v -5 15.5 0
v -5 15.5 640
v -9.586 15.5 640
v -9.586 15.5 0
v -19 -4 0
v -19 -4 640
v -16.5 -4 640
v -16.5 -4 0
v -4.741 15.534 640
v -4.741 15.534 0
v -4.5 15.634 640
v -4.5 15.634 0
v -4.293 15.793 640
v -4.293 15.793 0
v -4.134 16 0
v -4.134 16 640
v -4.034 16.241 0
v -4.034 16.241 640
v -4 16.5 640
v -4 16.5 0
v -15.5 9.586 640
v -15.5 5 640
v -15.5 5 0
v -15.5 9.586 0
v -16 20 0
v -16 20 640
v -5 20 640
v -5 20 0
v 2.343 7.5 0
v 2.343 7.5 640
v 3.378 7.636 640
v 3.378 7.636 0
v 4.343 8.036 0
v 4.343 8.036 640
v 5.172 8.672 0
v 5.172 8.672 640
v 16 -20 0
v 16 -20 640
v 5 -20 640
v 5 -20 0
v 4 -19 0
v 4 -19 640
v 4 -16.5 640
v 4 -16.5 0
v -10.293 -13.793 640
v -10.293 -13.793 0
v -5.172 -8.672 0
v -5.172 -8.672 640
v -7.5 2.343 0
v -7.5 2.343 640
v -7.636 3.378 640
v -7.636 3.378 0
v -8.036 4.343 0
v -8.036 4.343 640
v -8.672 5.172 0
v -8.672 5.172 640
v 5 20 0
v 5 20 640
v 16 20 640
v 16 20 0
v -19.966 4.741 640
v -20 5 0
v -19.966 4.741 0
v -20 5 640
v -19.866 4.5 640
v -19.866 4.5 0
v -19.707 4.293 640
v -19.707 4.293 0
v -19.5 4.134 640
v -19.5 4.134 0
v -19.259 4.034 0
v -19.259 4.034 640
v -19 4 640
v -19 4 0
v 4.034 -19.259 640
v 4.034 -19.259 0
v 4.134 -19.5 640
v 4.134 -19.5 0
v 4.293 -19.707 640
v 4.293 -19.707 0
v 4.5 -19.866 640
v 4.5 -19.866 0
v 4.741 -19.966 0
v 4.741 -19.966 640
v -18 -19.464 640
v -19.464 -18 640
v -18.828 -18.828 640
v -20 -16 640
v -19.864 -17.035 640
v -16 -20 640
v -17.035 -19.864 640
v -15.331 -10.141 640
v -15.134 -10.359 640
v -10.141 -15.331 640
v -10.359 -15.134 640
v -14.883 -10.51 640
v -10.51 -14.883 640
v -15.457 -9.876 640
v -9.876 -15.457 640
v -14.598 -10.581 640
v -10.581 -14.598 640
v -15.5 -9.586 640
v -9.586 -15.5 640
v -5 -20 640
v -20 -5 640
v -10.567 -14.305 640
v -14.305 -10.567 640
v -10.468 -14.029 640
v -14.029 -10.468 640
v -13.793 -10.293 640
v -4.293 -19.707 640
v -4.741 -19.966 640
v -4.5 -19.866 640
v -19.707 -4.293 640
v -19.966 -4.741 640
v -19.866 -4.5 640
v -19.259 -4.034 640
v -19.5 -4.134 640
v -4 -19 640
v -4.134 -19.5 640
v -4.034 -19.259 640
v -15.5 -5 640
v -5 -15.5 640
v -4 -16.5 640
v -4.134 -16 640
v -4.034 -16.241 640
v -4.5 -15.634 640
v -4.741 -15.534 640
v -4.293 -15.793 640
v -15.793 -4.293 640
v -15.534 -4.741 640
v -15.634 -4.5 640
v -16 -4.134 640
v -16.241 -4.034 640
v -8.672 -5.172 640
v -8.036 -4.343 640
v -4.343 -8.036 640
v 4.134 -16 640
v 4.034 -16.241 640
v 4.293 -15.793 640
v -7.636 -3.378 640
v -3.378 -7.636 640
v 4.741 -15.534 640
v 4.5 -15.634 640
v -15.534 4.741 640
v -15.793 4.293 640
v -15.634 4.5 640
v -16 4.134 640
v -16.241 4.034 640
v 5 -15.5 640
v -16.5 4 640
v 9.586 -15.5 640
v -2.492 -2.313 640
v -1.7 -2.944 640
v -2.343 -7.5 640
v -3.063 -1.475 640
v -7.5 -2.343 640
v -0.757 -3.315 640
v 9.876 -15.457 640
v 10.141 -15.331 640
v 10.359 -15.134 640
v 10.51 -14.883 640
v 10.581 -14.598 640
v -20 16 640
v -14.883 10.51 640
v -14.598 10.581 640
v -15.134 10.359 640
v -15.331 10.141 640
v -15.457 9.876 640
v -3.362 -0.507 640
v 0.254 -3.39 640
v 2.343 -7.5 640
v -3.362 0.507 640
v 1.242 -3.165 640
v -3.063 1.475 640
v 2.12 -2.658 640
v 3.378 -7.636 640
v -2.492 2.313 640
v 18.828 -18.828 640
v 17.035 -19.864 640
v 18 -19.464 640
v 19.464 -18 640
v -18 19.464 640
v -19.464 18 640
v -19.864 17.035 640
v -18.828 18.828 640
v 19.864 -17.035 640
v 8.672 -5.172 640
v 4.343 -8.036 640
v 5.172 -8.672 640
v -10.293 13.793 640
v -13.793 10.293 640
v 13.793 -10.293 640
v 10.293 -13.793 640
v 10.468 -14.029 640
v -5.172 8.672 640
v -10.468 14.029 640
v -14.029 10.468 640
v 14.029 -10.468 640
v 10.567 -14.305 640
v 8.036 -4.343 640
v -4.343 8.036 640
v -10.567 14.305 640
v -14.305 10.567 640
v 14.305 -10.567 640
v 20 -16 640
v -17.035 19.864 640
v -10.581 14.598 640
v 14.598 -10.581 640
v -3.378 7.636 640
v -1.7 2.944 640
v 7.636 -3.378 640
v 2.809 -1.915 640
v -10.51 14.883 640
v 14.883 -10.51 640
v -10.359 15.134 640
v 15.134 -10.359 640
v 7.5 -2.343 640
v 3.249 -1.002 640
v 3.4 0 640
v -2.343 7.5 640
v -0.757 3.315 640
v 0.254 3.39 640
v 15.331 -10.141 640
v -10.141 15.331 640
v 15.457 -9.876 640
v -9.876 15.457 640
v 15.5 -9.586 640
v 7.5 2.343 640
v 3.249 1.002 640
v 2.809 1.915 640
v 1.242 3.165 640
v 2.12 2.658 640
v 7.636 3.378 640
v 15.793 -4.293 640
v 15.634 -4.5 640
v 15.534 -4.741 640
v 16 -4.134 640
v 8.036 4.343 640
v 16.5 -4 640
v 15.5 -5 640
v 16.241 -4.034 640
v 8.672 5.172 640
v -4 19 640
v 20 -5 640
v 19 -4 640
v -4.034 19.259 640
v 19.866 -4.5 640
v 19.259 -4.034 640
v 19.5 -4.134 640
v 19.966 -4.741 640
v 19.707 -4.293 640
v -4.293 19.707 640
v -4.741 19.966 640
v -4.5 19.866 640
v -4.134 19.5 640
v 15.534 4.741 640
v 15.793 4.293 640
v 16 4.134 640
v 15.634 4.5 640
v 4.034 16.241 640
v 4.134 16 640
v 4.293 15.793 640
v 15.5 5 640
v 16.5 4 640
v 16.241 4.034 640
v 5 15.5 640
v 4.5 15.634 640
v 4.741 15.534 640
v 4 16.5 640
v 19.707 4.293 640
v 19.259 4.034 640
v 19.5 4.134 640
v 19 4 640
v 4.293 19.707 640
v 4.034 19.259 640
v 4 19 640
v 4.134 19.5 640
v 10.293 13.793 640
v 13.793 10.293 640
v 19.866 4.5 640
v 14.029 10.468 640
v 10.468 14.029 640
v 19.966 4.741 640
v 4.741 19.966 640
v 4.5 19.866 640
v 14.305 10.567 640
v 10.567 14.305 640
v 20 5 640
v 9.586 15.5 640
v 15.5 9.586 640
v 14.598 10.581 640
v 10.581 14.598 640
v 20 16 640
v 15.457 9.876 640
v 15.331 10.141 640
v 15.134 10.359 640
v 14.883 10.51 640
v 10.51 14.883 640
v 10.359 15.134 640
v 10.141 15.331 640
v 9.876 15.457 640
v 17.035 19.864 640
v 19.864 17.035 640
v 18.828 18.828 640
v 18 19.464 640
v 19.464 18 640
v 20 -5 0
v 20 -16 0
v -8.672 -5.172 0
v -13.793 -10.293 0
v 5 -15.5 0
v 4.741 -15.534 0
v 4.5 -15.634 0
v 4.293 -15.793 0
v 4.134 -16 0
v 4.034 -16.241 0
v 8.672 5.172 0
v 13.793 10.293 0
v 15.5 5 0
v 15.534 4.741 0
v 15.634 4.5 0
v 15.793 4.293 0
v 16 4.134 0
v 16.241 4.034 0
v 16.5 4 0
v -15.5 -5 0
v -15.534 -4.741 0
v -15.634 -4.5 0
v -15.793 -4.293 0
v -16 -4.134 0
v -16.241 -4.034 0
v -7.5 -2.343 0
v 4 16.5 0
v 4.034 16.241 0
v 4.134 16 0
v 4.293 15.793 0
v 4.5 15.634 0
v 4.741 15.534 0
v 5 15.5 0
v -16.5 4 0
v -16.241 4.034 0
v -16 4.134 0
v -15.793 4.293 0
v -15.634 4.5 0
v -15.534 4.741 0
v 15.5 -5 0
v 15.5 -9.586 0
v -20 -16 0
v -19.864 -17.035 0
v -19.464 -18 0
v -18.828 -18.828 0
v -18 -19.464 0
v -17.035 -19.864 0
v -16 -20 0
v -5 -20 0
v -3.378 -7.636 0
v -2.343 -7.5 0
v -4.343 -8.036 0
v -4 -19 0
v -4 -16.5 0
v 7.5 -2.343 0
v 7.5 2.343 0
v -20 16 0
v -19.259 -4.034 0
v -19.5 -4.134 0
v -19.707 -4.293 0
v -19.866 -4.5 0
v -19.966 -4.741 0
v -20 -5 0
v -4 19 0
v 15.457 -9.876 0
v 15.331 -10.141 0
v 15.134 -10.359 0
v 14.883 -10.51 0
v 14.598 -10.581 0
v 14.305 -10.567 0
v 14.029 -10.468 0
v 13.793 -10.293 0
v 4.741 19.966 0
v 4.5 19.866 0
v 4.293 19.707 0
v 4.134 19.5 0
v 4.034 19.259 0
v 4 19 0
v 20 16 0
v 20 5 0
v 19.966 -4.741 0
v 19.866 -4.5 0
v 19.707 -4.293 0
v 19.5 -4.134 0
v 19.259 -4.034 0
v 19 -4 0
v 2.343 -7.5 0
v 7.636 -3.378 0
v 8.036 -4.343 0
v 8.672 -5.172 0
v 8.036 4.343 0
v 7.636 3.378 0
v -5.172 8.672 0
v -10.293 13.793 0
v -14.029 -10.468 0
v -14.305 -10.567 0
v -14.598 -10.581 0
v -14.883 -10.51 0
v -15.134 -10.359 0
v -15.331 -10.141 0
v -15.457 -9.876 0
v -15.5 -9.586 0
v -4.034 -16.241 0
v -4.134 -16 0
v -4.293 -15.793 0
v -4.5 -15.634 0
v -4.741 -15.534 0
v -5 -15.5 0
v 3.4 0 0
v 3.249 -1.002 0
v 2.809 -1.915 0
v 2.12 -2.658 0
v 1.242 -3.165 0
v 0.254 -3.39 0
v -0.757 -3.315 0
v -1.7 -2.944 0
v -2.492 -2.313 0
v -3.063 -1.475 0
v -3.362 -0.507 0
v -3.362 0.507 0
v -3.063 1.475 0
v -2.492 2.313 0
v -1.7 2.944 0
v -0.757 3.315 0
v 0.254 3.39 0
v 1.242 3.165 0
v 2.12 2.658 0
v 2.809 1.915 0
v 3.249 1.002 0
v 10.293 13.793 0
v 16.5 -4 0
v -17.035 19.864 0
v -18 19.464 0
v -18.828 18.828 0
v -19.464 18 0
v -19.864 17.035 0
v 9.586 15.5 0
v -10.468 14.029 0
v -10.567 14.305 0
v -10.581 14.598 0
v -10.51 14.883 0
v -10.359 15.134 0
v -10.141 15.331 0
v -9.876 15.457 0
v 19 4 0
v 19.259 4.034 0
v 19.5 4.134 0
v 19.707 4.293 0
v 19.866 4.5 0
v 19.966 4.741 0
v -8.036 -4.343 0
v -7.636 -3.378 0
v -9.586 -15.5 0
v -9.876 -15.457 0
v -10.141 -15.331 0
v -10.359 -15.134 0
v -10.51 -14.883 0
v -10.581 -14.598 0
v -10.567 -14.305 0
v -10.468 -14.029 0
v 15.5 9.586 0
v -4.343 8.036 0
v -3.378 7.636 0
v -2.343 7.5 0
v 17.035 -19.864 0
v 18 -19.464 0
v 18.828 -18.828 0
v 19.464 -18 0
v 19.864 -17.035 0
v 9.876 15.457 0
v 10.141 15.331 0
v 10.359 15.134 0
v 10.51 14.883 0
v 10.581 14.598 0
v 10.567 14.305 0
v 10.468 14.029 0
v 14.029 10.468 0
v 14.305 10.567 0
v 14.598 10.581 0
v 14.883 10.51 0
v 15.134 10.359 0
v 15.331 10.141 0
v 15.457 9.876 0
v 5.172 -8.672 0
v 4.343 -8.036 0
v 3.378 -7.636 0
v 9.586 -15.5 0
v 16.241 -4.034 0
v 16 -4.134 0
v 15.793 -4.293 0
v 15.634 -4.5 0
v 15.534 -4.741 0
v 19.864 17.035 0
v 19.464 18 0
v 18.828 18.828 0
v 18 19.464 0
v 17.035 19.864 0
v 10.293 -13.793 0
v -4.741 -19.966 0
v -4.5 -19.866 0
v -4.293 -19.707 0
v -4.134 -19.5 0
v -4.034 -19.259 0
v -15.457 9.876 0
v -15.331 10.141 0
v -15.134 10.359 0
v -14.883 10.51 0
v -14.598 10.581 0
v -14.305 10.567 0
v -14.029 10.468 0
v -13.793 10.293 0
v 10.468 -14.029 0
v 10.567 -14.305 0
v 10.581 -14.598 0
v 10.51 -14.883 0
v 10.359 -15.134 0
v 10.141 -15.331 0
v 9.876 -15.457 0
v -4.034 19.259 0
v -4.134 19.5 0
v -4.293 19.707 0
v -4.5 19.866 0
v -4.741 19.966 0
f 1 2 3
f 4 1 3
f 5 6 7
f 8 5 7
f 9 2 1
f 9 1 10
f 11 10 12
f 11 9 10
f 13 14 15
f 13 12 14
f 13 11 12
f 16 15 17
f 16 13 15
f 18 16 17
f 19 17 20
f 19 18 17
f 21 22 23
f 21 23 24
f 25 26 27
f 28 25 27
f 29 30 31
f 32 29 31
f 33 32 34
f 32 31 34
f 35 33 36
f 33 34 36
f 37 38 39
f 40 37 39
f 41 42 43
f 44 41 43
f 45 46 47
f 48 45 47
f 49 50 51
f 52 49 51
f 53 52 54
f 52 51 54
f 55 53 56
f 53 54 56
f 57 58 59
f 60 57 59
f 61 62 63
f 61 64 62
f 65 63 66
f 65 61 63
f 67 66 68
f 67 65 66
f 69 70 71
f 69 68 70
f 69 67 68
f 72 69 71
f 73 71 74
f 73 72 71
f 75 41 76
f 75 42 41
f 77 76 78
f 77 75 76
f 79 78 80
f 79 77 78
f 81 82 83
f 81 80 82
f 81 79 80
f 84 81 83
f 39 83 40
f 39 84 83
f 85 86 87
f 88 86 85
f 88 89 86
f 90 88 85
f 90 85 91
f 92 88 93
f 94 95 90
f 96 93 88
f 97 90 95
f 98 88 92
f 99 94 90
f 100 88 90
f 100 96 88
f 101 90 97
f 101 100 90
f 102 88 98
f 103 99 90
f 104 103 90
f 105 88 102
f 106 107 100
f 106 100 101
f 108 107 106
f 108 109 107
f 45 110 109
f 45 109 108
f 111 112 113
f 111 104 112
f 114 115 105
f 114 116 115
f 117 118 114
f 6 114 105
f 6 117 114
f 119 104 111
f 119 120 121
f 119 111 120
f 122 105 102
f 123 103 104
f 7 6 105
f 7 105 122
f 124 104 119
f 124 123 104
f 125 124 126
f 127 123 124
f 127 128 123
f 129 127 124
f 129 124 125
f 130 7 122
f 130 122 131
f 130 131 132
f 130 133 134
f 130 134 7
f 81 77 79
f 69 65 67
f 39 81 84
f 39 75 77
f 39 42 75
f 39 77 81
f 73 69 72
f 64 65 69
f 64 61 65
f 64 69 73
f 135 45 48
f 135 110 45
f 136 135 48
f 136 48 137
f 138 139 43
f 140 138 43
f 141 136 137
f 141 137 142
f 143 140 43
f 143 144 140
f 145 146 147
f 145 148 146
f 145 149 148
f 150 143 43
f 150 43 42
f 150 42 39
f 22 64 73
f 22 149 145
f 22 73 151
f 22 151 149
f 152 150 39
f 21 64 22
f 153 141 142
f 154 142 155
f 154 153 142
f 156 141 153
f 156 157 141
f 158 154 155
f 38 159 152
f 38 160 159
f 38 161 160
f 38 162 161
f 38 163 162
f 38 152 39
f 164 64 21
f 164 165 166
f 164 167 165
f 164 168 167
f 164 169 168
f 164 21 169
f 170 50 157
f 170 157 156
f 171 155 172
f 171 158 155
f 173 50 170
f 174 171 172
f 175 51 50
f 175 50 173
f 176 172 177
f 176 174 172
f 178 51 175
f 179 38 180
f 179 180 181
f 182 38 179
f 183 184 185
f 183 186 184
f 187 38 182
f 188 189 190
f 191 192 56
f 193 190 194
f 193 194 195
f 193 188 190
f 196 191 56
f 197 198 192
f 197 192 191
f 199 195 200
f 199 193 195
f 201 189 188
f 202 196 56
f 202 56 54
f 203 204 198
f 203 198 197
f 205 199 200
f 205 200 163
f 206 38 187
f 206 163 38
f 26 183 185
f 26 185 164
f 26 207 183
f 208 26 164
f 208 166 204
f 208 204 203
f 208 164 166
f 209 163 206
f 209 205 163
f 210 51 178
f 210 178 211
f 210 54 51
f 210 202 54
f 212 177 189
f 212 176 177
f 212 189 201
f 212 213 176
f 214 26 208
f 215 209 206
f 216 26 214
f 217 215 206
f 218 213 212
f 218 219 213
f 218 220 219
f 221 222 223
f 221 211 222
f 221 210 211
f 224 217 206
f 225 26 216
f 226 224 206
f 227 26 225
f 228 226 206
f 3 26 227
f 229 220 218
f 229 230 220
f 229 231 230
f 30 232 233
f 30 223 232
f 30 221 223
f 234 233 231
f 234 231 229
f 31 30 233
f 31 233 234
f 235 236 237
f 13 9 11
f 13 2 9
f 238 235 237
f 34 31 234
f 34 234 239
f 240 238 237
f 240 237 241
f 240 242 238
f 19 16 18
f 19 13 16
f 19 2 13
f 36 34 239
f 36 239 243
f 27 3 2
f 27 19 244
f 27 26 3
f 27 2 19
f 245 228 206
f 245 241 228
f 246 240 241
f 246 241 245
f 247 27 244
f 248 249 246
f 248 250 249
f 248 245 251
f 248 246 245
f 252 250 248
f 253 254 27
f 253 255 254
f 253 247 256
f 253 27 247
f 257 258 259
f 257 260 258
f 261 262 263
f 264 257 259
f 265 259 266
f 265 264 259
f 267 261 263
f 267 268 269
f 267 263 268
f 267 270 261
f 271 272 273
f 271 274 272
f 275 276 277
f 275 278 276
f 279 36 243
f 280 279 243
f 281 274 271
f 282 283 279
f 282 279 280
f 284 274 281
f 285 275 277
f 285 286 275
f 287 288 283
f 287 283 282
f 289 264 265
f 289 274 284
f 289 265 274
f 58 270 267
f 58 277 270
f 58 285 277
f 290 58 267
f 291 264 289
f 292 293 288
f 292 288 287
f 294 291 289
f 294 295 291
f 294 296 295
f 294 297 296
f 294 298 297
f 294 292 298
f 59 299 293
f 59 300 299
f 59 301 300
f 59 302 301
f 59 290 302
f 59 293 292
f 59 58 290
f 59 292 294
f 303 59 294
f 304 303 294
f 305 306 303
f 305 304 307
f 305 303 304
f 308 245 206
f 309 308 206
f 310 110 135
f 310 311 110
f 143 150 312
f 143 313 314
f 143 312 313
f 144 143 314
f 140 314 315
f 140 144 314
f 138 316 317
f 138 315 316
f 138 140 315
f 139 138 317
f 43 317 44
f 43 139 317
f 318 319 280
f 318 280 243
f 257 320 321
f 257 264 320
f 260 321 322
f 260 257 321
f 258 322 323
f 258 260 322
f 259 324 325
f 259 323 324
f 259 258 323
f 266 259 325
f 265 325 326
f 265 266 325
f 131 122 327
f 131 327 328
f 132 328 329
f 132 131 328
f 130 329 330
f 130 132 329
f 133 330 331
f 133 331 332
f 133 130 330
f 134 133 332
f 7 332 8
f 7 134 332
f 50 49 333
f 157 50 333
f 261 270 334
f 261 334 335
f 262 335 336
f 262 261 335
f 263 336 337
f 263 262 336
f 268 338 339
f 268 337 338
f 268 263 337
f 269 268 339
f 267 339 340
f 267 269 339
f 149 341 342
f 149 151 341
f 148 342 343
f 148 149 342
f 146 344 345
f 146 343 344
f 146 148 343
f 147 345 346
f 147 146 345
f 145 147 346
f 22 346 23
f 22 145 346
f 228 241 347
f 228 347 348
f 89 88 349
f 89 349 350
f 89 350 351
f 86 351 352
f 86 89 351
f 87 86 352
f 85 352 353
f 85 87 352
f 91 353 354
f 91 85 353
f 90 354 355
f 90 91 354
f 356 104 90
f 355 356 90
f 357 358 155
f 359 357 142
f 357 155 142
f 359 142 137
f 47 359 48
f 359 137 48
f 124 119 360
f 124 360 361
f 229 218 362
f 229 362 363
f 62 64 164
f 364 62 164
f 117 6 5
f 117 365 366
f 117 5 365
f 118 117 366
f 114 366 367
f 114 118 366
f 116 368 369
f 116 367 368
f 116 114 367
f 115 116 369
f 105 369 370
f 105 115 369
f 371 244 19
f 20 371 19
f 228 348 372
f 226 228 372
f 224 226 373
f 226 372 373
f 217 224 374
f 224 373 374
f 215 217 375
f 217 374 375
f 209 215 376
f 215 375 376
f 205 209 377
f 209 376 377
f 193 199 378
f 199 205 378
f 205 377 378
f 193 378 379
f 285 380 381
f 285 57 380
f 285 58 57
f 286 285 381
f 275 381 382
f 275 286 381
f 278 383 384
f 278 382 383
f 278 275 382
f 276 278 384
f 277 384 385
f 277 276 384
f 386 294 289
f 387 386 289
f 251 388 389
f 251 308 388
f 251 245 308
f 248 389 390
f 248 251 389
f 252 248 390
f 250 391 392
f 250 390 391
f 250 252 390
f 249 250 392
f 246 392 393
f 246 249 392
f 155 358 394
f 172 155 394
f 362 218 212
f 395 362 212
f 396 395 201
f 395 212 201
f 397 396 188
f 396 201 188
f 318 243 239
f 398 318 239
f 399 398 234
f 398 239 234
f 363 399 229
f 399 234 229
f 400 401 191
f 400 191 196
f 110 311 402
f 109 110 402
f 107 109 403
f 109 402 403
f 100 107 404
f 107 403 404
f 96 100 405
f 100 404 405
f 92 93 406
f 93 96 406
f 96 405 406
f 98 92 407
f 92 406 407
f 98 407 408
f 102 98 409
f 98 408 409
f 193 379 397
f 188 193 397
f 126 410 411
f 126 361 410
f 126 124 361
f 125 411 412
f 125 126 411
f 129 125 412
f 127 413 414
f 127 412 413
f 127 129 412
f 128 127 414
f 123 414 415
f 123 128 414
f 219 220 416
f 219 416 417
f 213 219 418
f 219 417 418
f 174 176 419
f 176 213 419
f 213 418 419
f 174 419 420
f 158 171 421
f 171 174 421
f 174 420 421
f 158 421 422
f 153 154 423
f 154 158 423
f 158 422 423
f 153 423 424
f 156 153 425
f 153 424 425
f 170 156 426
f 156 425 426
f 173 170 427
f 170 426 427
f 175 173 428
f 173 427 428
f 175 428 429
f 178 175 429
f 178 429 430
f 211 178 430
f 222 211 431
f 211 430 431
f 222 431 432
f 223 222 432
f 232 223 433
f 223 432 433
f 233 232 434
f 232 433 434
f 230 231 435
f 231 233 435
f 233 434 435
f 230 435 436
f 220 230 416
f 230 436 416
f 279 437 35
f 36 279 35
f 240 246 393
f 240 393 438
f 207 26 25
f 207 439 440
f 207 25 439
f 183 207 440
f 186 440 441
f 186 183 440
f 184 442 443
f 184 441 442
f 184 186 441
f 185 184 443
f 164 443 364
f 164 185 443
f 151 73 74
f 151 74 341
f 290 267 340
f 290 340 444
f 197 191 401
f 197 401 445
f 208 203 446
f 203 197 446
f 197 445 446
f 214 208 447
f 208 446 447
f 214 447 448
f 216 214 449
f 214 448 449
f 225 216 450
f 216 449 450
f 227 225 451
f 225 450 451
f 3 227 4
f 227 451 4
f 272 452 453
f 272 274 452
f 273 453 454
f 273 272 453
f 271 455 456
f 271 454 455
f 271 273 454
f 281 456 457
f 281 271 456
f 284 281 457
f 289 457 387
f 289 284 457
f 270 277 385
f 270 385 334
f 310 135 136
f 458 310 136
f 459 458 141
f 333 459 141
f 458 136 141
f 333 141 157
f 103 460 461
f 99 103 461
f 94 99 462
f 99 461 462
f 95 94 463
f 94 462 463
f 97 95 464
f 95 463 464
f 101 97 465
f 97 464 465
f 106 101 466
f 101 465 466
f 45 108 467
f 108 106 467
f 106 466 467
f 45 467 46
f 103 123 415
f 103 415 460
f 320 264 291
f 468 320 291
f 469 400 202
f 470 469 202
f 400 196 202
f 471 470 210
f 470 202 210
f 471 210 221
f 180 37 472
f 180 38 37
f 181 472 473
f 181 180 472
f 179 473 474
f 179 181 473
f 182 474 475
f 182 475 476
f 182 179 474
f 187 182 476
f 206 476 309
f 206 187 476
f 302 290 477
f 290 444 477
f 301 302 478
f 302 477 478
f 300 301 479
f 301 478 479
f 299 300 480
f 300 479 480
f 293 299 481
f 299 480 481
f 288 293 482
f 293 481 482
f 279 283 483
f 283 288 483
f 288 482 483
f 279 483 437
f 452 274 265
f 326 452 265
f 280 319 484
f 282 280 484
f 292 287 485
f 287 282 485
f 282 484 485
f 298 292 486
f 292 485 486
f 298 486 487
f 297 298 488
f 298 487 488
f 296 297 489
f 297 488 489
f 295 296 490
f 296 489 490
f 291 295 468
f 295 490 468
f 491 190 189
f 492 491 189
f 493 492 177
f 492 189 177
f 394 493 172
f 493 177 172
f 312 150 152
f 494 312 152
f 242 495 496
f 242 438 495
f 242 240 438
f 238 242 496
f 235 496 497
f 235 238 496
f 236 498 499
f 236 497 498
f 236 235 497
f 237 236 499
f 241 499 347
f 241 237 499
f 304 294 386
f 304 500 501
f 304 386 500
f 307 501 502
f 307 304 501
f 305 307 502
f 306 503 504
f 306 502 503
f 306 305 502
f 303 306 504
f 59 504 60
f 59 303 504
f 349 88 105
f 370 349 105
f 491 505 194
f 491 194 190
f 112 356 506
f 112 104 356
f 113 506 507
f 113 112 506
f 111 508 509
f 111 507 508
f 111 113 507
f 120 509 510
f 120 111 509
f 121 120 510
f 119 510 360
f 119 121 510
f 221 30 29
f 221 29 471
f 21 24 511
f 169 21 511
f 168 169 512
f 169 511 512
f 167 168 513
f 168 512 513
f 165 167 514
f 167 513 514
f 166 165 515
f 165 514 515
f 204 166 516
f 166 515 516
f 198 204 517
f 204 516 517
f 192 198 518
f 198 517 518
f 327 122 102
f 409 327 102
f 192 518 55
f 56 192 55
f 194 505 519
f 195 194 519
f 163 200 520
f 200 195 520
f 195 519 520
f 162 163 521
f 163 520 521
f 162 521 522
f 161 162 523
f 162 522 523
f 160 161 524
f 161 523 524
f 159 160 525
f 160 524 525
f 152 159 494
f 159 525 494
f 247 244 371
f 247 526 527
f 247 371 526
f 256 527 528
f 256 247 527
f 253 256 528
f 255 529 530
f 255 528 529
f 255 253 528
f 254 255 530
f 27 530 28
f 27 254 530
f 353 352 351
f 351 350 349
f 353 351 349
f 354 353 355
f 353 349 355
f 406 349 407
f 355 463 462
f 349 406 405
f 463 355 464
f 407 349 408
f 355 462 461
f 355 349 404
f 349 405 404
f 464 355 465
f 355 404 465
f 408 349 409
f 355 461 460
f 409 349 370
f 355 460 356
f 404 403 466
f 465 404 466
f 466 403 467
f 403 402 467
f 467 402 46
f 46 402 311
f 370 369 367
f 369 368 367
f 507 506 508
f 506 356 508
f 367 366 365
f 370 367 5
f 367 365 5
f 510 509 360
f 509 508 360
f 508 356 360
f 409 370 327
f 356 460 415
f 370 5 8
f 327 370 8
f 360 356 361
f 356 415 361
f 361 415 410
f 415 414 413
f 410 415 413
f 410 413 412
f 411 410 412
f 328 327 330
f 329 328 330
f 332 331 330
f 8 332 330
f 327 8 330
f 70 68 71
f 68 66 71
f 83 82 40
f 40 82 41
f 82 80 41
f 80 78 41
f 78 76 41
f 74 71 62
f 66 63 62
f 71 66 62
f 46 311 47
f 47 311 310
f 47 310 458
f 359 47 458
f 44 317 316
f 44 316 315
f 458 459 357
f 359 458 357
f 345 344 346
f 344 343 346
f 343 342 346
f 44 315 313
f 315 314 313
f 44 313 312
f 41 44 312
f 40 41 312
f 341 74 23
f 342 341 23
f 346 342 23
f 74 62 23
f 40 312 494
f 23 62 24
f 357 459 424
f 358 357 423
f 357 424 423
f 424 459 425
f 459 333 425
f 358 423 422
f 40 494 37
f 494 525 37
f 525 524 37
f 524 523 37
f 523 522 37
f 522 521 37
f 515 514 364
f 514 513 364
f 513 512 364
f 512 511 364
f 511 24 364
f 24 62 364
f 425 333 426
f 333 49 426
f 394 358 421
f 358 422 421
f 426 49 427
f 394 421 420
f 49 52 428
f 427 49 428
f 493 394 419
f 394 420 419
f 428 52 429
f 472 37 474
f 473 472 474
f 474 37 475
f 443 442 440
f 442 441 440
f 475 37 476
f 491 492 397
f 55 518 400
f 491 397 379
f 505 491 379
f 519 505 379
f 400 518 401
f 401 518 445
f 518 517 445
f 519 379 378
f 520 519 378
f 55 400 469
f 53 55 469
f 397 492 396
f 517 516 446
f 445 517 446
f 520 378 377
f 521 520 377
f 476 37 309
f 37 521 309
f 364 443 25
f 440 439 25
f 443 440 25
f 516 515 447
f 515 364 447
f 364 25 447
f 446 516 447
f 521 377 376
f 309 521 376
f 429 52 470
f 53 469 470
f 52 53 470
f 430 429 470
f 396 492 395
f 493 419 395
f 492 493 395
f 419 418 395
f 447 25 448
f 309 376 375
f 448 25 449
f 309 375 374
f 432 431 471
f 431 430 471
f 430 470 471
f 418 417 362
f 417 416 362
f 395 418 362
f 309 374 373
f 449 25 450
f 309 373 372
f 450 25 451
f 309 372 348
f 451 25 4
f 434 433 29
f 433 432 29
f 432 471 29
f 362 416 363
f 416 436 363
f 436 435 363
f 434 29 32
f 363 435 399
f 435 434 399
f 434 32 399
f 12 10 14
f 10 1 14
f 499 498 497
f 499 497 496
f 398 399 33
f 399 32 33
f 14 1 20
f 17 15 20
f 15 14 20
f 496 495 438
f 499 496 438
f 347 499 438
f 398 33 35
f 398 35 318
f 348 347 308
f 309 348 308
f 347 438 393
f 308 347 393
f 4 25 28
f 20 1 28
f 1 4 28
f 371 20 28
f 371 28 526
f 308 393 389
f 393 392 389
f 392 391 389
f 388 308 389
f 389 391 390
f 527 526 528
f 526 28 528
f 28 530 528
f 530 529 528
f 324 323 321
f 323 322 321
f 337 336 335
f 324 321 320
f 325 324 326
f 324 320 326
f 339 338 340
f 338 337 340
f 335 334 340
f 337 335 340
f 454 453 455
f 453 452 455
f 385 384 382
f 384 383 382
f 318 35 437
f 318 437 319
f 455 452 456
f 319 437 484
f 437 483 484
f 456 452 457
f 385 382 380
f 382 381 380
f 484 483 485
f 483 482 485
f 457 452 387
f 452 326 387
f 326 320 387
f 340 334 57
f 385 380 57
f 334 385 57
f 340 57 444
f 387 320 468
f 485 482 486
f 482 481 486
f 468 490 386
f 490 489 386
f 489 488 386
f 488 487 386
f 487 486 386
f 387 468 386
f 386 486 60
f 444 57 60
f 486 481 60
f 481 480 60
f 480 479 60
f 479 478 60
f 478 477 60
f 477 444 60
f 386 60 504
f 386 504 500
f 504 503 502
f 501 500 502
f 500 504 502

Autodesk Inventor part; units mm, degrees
ref_plane "YZ Plane" through (0, 0, 0) normal (1, 0, 0) x (0, 1, 0)
ref_plane "XZ Plane" through (0, 0, 0) normal (0, 1, 0) x (-1, 0, 0)
ref_plane "XY Plane" through (0, 0, 0) normal (0, 0, 1) x (1, 0, 0)
sketch "T-Slot 4040 Base" plane through (0, 0, 0) normal (0, 0, 1) x (1, 0, 0)
  line L0 (-28, 0) -> (28, 0) construction
  line L1 (0, -28) -> (0, 28) construction
  circle A0 centre (0, 0) radius 3.4
  line L2 (-7.5, -7.5) -> (7.5, -7.5)
  line L3 (7.5, -7.5) -> (7.5, 7.5)
  line L4 (7.5, 7.5) -> (-7.5, 7.5)
  line L5 (-7.5, 7.5) -> (-7.5, -7.5)
  line L6 (-7.5, -7.5) -> (7.5, 7.5) construction
  line L7 (7.5, -7.5) -> (-7.5, 7.5) construction
  line L8 (20, 4) -> (15.5, 4)
  line L9 (15.5, 4) -> (15.5, 12)
  line L10 (15.5, 12) -> (7.5, 4)
  line L11 (4, 20) -> (4, 15.5)
  line L12 (4, 15.5) -> (12, 15.5)
  line L13 (12, 15.5) -> (4, 7.5)
  line L14 (7.5, -7.5) -> (-7.5, -7.5)
  arc A1 (15.5, 9.5858) -> (13.7929, 10.2929) centre (14.5, 9.5858) ccw
  arc A2 (10.2929, 13.7929) -> (9.5858, 15.5) centre (9.5858, 14.5) ccw
  line L15 (-20, 20) -> (20, 20)
  line L16 (20, 20) -> (20, -20)
  line L17 (20, -20) -> (-20, -20)
  line L18 (-20, -20) -> (-20, 20)
  line L19 (-20, 20) -> (20, -20) construction
  line L20 (20, 20) -> (-20, -20) construction
  line L21 (-4, 15.5) -> (-12, 15.5)
  arc A3 (-9.5858, 15.5) -> (-10.2929, 13.7929) centre (-9.5858, 14.5) ccw
  line L22 (-12, 15.5) -> (-4, 7.5)
  line L23 (-15.5, 12) -> (-7.5, 4)
  line L24 (-20, 4) -> (-15.5, 4)
  arc A4 (-13.7929, 10.2929) -> (-15.5, 9.5858) centre (-14.5, 9.5858) ccw
  line L25 (-15.5, 4) -> (-15.5, 12)
  line L26 (-4, 20) -> (-4, 15.5)
  line L27 (-15.5, -4) -> (-15.5, -12)
  arc A5 (-15.5, -9.5858) -> (-13.7929, -10.2929) centre (-14.5, -9.5858) ccw
  line L28 (-15.5, -12) -> (-7.5, -4)
  line L29 (-12, -15.5) -> (-4, -7.5)
  line L30 (-4, -20) -> (-4, -15.5)
  arc A6 (-10.2929, -13.7929) -> (-9.5858, -15.5) centre (-9.5858, -14.5) ccw
  line L31 (-4, -15.5) -> (-12, -15.5)
  line L32 (-20, -4) -> (-15.5, -4)
  line L33 (4, -15.5) -> (12, -15.5)
  arc A7 (9.5858, -15.5) -> (10.2929, -13.7929) centre (9.5858, -14.5) ccw
  line L34 (12, -15.5) -> (4, -7.5)
  line L35 (15.5, -12) -> (7.5, -4)
  line L36 (20, -4) -> (15.5, -4)
  arc A8 (13.7929, -10.2929) -> (15.5, -9.5858) centre (14.5, -9.5858) ccw
  line L37 (15.5, -4) -> (15.5, -12)
  line L38 (4, -20) -> (4, -15.5)
  point P0 (4.9274, 7.75)
  point P1 (9.5858, 15.5)
  point P2 (-20, 20)
  point P3 (-7.5, -7.5)
  point P4 (-20, -20)
  point P5 (7.5, -7.5)
  point P6 (20, -20)
  point P7 (-9.5858, -15.5)
  point P8 (-4, -7.5)
  point P9 (15.5, -9.5858)
  point P10 (7.5, -4)
  point P11 (-15.5, 9.5858)
  point P12 (-4, 7.5)
  dimension "d35" = 6.8
  dimension "d37" = 12
  dimension "d38" = 1
  dimension "d43" = 40
  dimension "d44" = 40
  dimension "d45" = 4.5
  dimension "d46" = 4
  dimension "d53" = 360
extrude "Extrusion1" add sketch "T-Slot 4040 Base" along normal blind 640 contours L5 L4 L3 L2 | L2 L29 L31 L30 L17 L18 L32 L27 L28 L5 | L2 L3 L35 L37 L36 L16 L17 L38 L33 L34 | A6 L31 L29 | L23 L25 L24 L18 L15 L26 L21 L22 L4 L5 | L28 L27 A5 | L34 L33 A7 | A4 L25 L23 | L3 L4 L13 L12 L11 L15 L16 L8 L9 L10 | A8 L37 L35 | L22 L21 A3 | L10 L9 A1 | A2 L12 L13
fillet "Rundung1" radius 1 16 edges at (4, 15.5, 320) (15.5, 4, 320) (20, 4, 320) (4, 20, 320) (-20, 4, 320) (-15.5, 4, 320) (-4, 15.5, 320) (-4, 20, 320) (-4, -15.5, 320) (-4, -20, 320) (4, -15.5, 320) (4, -20, 320) (15.5, -4, 320) (20, -4, 320) (-20, -4, 320) (-15.5, -4, 320)
fillet "Rundung2" radius 4 12 edges at (4, 7.5, 320) (7.5, 4, 320) (-20, 20, 320) (-20, -20, 320) (20, 20, 320) (20, -20, 320) (7.5, -4, 320) (-7.5, -4, 320) (-7.5, 4, 320) (4, -7.5, 320) (-4, -7.5, 320) (-4, 7.5, 320)
properties part number "T-SLOT 4040 B-Type 640mm"
